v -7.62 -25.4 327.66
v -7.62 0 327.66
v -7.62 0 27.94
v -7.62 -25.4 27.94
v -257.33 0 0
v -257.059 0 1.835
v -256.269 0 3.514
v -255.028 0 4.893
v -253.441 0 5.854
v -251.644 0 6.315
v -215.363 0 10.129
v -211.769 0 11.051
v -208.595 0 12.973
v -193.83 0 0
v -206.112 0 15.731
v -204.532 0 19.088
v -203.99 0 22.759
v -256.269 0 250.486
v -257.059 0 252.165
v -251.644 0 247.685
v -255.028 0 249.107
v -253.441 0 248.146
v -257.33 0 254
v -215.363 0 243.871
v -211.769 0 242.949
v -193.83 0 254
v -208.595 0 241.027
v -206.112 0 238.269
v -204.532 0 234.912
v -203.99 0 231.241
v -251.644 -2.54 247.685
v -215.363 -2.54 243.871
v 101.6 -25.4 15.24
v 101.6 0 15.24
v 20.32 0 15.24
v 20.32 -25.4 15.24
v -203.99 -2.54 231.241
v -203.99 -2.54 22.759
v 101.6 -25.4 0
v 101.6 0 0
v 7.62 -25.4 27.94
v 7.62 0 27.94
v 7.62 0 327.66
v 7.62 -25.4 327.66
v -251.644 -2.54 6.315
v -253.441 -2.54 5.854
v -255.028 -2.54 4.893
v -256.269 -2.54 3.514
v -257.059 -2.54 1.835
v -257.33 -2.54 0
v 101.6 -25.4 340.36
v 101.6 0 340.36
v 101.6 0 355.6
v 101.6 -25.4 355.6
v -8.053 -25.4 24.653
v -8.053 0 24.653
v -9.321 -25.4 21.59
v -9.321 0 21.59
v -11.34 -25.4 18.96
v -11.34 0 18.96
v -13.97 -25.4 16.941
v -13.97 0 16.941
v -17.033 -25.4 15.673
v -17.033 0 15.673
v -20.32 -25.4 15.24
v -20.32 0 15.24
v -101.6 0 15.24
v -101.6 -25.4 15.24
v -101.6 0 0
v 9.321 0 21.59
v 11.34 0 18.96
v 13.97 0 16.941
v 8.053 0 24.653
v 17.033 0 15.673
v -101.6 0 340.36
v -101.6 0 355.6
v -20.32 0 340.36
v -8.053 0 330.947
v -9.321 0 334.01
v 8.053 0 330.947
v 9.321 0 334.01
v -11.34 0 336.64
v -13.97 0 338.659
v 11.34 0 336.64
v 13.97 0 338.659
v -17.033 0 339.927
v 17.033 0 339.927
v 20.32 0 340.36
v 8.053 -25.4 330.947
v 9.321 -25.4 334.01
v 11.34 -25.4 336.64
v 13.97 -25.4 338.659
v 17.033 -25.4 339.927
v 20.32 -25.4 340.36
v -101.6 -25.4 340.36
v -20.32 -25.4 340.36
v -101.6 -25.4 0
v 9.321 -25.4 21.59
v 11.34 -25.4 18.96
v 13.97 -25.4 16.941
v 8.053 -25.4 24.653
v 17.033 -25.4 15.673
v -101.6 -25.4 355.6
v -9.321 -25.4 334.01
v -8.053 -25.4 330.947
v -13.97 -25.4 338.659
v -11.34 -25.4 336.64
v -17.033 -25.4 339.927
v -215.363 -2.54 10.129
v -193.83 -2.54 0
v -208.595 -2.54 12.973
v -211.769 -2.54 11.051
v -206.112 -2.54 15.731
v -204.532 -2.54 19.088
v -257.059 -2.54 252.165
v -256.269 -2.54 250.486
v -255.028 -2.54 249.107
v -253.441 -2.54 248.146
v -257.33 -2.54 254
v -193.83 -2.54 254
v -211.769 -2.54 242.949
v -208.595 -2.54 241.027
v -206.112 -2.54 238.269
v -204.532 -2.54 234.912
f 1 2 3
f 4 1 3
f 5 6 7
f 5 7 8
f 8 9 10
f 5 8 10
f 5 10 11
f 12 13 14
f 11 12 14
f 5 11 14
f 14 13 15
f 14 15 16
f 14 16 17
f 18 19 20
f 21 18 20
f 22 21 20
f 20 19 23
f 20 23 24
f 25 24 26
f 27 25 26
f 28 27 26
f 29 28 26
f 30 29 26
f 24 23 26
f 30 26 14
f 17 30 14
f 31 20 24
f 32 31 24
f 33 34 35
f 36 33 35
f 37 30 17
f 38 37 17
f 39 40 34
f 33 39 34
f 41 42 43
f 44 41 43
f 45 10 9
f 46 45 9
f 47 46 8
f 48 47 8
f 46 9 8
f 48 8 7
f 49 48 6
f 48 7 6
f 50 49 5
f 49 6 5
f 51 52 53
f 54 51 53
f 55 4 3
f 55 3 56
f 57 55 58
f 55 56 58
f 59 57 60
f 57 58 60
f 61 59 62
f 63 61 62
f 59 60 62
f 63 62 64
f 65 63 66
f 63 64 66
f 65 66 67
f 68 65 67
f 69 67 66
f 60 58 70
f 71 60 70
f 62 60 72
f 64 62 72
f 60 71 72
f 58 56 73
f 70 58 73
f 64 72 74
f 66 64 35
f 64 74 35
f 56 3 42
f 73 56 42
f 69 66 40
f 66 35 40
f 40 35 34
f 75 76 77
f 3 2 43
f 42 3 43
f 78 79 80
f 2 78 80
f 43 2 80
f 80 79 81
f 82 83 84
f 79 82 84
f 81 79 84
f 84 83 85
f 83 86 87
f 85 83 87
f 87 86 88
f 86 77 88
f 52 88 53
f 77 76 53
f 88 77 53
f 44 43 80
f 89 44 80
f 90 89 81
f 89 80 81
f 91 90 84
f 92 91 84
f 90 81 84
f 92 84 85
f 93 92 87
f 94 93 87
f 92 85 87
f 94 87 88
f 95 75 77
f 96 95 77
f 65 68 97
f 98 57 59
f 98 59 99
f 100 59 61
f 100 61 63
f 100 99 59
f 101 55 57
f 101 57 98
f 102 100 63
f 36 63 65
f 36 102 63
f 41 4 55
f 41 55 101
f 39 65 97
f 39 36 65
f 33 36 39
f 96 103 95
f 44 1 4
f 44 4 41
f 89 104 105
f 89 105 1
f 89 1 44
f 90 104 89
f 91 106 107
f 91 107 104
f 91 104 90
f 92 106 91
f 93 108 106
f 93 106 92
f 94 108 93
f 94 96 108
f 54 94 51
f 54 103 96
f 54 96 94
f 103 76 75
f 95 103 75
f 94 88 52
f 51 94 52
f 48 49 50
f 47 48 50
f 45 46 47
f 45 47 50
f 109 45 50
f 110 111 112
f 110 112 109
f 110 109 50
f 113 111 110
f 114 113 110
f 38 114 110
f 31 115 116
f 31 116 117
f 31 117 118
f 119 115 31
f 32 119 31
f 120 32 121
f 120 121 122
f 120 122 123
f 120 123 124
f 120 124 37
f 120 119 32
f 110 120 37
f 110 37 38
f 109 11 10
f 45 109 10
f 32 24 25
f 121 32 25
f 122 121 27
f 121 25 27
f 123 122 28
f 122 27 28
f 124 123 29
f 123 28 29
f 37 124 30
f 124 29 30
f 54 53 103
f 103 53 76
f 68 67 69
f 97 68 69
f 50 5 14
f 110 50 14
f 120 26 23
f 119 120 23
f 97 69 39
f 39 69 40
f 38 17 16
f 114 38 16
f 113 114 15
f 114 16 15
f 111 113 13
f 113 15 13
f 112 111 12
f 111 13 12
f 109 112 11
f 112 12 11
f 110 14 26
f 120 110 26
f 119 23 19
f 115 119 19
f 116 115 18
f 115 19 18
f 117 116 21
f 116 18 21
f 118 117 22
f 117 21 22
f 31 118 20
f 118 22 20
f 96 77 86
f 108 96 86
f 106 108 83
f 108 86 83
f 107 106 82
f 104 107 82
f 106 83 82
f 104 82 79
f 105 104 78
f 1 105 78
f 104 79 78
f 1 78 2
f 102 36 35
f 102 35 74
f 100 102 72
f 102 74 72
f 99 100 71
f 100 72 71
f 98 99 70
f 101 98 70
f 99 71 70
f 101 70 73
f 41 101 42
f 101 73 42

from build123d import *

# Parameters (mm, degrees)
F1_DEPTH = 25.4
F3_DEPTH = 2.54


with BuildPart() as f1:
    # F0 (on Front) → F1 (new body)
    with BuildSketch(Plane.XZ):
        with BuildLine():
            Line((-101.6, 15.24), (-101.6, 0))
            Line((-101.6, 0), (0, 0))
            Line((0, 0), (101.6, 0))
            Line((101.6, 0), (101.6, 15.24))
            Line((101.6, 15.24), (20.32, 15.24))
            ThreePointArc((20.32, 15.24), (11.339744, 18.959744), (7.62, 27.94))
            Line((7.62, 27.94), (7.62, 327.66))
            ThreePointArc((7.62, 327.66), (11.339744, 336.640256), (20.32, 340.36))
            Line((20.32, 340.36), (101.6, 340.36))
            Line((101.6, 340.36), (101.6, 355.6))
            Line((101.6, 355.6), (0, 355.6))
            Line((0, 355.6), (-101.6, 355.6))
            Line((-101.6, 355.6), (-101.6, 340.36))
            Line((-101.6, 340.36), (-20.32, 340.36))
            ThreePointArc((-20.32, 340.36), (-11.339744, 336.640256), (-7.62, 327.66))
            Line((-7.62, 327.66), (-7.62, 27.94))
            ThreePointArc((-7.62, 27.94), (-11.339744, 18.959744), (-20.32, 15.24))
            Line((-20.32, 15.24), (-101.6, 15.24))
        make_face()
    extrude(amount=F1_DEPTH)


with BuildPart() as f3:
    # F2 (on Front) → F3 (new body)
    with BuildSketch(Plane.XZ):
        with BuildLine():
            Line((-193.830329, 0), (-193.830329, 127))
            Line((-193.830329, 127), (-203.990329, 127))
            Line((-203.990329, 127), (-203.990329, 22.758957))
            ThreePointArc((-203.990329, 22.758957), (-207.252389, 14.260998), (-215.362817, 10.128529))
            Line((-215.362817, 10.128529), (-251.644084, 6.315214))
            ThreePointArc((-251.644084, 6.315214), (-255.699298, 4.248979), (-257.330329, 0))
            Line((-257.330329, 0), (-193.830329, 0))
        make_face()
        with BuildLine():
            Line((-203.990329, 127), (-193.830329, 127))
            Line((-193.830329, 127), (-193.830329, 254))
            Line((-193.830329, 254), (-257.330329, 254))
            ThreePointArc((-257.330329, 254), (-255.699298, 249.751021), (-251.644084, 247.684786))
            Line((-251.644084, 247.684786), (-215.362817, 243.871471))
            ThreePointArc((-215.362817, 243.871471), (-207.252389, 239.739002), (-203.990329, 231.241043))
            Line((-203.990329, 231.241043), (-203.990329, 127))
        make_face()
    extrude(amount=F3_DEPTH)


solid = Compound([f1.part, f3.part])
